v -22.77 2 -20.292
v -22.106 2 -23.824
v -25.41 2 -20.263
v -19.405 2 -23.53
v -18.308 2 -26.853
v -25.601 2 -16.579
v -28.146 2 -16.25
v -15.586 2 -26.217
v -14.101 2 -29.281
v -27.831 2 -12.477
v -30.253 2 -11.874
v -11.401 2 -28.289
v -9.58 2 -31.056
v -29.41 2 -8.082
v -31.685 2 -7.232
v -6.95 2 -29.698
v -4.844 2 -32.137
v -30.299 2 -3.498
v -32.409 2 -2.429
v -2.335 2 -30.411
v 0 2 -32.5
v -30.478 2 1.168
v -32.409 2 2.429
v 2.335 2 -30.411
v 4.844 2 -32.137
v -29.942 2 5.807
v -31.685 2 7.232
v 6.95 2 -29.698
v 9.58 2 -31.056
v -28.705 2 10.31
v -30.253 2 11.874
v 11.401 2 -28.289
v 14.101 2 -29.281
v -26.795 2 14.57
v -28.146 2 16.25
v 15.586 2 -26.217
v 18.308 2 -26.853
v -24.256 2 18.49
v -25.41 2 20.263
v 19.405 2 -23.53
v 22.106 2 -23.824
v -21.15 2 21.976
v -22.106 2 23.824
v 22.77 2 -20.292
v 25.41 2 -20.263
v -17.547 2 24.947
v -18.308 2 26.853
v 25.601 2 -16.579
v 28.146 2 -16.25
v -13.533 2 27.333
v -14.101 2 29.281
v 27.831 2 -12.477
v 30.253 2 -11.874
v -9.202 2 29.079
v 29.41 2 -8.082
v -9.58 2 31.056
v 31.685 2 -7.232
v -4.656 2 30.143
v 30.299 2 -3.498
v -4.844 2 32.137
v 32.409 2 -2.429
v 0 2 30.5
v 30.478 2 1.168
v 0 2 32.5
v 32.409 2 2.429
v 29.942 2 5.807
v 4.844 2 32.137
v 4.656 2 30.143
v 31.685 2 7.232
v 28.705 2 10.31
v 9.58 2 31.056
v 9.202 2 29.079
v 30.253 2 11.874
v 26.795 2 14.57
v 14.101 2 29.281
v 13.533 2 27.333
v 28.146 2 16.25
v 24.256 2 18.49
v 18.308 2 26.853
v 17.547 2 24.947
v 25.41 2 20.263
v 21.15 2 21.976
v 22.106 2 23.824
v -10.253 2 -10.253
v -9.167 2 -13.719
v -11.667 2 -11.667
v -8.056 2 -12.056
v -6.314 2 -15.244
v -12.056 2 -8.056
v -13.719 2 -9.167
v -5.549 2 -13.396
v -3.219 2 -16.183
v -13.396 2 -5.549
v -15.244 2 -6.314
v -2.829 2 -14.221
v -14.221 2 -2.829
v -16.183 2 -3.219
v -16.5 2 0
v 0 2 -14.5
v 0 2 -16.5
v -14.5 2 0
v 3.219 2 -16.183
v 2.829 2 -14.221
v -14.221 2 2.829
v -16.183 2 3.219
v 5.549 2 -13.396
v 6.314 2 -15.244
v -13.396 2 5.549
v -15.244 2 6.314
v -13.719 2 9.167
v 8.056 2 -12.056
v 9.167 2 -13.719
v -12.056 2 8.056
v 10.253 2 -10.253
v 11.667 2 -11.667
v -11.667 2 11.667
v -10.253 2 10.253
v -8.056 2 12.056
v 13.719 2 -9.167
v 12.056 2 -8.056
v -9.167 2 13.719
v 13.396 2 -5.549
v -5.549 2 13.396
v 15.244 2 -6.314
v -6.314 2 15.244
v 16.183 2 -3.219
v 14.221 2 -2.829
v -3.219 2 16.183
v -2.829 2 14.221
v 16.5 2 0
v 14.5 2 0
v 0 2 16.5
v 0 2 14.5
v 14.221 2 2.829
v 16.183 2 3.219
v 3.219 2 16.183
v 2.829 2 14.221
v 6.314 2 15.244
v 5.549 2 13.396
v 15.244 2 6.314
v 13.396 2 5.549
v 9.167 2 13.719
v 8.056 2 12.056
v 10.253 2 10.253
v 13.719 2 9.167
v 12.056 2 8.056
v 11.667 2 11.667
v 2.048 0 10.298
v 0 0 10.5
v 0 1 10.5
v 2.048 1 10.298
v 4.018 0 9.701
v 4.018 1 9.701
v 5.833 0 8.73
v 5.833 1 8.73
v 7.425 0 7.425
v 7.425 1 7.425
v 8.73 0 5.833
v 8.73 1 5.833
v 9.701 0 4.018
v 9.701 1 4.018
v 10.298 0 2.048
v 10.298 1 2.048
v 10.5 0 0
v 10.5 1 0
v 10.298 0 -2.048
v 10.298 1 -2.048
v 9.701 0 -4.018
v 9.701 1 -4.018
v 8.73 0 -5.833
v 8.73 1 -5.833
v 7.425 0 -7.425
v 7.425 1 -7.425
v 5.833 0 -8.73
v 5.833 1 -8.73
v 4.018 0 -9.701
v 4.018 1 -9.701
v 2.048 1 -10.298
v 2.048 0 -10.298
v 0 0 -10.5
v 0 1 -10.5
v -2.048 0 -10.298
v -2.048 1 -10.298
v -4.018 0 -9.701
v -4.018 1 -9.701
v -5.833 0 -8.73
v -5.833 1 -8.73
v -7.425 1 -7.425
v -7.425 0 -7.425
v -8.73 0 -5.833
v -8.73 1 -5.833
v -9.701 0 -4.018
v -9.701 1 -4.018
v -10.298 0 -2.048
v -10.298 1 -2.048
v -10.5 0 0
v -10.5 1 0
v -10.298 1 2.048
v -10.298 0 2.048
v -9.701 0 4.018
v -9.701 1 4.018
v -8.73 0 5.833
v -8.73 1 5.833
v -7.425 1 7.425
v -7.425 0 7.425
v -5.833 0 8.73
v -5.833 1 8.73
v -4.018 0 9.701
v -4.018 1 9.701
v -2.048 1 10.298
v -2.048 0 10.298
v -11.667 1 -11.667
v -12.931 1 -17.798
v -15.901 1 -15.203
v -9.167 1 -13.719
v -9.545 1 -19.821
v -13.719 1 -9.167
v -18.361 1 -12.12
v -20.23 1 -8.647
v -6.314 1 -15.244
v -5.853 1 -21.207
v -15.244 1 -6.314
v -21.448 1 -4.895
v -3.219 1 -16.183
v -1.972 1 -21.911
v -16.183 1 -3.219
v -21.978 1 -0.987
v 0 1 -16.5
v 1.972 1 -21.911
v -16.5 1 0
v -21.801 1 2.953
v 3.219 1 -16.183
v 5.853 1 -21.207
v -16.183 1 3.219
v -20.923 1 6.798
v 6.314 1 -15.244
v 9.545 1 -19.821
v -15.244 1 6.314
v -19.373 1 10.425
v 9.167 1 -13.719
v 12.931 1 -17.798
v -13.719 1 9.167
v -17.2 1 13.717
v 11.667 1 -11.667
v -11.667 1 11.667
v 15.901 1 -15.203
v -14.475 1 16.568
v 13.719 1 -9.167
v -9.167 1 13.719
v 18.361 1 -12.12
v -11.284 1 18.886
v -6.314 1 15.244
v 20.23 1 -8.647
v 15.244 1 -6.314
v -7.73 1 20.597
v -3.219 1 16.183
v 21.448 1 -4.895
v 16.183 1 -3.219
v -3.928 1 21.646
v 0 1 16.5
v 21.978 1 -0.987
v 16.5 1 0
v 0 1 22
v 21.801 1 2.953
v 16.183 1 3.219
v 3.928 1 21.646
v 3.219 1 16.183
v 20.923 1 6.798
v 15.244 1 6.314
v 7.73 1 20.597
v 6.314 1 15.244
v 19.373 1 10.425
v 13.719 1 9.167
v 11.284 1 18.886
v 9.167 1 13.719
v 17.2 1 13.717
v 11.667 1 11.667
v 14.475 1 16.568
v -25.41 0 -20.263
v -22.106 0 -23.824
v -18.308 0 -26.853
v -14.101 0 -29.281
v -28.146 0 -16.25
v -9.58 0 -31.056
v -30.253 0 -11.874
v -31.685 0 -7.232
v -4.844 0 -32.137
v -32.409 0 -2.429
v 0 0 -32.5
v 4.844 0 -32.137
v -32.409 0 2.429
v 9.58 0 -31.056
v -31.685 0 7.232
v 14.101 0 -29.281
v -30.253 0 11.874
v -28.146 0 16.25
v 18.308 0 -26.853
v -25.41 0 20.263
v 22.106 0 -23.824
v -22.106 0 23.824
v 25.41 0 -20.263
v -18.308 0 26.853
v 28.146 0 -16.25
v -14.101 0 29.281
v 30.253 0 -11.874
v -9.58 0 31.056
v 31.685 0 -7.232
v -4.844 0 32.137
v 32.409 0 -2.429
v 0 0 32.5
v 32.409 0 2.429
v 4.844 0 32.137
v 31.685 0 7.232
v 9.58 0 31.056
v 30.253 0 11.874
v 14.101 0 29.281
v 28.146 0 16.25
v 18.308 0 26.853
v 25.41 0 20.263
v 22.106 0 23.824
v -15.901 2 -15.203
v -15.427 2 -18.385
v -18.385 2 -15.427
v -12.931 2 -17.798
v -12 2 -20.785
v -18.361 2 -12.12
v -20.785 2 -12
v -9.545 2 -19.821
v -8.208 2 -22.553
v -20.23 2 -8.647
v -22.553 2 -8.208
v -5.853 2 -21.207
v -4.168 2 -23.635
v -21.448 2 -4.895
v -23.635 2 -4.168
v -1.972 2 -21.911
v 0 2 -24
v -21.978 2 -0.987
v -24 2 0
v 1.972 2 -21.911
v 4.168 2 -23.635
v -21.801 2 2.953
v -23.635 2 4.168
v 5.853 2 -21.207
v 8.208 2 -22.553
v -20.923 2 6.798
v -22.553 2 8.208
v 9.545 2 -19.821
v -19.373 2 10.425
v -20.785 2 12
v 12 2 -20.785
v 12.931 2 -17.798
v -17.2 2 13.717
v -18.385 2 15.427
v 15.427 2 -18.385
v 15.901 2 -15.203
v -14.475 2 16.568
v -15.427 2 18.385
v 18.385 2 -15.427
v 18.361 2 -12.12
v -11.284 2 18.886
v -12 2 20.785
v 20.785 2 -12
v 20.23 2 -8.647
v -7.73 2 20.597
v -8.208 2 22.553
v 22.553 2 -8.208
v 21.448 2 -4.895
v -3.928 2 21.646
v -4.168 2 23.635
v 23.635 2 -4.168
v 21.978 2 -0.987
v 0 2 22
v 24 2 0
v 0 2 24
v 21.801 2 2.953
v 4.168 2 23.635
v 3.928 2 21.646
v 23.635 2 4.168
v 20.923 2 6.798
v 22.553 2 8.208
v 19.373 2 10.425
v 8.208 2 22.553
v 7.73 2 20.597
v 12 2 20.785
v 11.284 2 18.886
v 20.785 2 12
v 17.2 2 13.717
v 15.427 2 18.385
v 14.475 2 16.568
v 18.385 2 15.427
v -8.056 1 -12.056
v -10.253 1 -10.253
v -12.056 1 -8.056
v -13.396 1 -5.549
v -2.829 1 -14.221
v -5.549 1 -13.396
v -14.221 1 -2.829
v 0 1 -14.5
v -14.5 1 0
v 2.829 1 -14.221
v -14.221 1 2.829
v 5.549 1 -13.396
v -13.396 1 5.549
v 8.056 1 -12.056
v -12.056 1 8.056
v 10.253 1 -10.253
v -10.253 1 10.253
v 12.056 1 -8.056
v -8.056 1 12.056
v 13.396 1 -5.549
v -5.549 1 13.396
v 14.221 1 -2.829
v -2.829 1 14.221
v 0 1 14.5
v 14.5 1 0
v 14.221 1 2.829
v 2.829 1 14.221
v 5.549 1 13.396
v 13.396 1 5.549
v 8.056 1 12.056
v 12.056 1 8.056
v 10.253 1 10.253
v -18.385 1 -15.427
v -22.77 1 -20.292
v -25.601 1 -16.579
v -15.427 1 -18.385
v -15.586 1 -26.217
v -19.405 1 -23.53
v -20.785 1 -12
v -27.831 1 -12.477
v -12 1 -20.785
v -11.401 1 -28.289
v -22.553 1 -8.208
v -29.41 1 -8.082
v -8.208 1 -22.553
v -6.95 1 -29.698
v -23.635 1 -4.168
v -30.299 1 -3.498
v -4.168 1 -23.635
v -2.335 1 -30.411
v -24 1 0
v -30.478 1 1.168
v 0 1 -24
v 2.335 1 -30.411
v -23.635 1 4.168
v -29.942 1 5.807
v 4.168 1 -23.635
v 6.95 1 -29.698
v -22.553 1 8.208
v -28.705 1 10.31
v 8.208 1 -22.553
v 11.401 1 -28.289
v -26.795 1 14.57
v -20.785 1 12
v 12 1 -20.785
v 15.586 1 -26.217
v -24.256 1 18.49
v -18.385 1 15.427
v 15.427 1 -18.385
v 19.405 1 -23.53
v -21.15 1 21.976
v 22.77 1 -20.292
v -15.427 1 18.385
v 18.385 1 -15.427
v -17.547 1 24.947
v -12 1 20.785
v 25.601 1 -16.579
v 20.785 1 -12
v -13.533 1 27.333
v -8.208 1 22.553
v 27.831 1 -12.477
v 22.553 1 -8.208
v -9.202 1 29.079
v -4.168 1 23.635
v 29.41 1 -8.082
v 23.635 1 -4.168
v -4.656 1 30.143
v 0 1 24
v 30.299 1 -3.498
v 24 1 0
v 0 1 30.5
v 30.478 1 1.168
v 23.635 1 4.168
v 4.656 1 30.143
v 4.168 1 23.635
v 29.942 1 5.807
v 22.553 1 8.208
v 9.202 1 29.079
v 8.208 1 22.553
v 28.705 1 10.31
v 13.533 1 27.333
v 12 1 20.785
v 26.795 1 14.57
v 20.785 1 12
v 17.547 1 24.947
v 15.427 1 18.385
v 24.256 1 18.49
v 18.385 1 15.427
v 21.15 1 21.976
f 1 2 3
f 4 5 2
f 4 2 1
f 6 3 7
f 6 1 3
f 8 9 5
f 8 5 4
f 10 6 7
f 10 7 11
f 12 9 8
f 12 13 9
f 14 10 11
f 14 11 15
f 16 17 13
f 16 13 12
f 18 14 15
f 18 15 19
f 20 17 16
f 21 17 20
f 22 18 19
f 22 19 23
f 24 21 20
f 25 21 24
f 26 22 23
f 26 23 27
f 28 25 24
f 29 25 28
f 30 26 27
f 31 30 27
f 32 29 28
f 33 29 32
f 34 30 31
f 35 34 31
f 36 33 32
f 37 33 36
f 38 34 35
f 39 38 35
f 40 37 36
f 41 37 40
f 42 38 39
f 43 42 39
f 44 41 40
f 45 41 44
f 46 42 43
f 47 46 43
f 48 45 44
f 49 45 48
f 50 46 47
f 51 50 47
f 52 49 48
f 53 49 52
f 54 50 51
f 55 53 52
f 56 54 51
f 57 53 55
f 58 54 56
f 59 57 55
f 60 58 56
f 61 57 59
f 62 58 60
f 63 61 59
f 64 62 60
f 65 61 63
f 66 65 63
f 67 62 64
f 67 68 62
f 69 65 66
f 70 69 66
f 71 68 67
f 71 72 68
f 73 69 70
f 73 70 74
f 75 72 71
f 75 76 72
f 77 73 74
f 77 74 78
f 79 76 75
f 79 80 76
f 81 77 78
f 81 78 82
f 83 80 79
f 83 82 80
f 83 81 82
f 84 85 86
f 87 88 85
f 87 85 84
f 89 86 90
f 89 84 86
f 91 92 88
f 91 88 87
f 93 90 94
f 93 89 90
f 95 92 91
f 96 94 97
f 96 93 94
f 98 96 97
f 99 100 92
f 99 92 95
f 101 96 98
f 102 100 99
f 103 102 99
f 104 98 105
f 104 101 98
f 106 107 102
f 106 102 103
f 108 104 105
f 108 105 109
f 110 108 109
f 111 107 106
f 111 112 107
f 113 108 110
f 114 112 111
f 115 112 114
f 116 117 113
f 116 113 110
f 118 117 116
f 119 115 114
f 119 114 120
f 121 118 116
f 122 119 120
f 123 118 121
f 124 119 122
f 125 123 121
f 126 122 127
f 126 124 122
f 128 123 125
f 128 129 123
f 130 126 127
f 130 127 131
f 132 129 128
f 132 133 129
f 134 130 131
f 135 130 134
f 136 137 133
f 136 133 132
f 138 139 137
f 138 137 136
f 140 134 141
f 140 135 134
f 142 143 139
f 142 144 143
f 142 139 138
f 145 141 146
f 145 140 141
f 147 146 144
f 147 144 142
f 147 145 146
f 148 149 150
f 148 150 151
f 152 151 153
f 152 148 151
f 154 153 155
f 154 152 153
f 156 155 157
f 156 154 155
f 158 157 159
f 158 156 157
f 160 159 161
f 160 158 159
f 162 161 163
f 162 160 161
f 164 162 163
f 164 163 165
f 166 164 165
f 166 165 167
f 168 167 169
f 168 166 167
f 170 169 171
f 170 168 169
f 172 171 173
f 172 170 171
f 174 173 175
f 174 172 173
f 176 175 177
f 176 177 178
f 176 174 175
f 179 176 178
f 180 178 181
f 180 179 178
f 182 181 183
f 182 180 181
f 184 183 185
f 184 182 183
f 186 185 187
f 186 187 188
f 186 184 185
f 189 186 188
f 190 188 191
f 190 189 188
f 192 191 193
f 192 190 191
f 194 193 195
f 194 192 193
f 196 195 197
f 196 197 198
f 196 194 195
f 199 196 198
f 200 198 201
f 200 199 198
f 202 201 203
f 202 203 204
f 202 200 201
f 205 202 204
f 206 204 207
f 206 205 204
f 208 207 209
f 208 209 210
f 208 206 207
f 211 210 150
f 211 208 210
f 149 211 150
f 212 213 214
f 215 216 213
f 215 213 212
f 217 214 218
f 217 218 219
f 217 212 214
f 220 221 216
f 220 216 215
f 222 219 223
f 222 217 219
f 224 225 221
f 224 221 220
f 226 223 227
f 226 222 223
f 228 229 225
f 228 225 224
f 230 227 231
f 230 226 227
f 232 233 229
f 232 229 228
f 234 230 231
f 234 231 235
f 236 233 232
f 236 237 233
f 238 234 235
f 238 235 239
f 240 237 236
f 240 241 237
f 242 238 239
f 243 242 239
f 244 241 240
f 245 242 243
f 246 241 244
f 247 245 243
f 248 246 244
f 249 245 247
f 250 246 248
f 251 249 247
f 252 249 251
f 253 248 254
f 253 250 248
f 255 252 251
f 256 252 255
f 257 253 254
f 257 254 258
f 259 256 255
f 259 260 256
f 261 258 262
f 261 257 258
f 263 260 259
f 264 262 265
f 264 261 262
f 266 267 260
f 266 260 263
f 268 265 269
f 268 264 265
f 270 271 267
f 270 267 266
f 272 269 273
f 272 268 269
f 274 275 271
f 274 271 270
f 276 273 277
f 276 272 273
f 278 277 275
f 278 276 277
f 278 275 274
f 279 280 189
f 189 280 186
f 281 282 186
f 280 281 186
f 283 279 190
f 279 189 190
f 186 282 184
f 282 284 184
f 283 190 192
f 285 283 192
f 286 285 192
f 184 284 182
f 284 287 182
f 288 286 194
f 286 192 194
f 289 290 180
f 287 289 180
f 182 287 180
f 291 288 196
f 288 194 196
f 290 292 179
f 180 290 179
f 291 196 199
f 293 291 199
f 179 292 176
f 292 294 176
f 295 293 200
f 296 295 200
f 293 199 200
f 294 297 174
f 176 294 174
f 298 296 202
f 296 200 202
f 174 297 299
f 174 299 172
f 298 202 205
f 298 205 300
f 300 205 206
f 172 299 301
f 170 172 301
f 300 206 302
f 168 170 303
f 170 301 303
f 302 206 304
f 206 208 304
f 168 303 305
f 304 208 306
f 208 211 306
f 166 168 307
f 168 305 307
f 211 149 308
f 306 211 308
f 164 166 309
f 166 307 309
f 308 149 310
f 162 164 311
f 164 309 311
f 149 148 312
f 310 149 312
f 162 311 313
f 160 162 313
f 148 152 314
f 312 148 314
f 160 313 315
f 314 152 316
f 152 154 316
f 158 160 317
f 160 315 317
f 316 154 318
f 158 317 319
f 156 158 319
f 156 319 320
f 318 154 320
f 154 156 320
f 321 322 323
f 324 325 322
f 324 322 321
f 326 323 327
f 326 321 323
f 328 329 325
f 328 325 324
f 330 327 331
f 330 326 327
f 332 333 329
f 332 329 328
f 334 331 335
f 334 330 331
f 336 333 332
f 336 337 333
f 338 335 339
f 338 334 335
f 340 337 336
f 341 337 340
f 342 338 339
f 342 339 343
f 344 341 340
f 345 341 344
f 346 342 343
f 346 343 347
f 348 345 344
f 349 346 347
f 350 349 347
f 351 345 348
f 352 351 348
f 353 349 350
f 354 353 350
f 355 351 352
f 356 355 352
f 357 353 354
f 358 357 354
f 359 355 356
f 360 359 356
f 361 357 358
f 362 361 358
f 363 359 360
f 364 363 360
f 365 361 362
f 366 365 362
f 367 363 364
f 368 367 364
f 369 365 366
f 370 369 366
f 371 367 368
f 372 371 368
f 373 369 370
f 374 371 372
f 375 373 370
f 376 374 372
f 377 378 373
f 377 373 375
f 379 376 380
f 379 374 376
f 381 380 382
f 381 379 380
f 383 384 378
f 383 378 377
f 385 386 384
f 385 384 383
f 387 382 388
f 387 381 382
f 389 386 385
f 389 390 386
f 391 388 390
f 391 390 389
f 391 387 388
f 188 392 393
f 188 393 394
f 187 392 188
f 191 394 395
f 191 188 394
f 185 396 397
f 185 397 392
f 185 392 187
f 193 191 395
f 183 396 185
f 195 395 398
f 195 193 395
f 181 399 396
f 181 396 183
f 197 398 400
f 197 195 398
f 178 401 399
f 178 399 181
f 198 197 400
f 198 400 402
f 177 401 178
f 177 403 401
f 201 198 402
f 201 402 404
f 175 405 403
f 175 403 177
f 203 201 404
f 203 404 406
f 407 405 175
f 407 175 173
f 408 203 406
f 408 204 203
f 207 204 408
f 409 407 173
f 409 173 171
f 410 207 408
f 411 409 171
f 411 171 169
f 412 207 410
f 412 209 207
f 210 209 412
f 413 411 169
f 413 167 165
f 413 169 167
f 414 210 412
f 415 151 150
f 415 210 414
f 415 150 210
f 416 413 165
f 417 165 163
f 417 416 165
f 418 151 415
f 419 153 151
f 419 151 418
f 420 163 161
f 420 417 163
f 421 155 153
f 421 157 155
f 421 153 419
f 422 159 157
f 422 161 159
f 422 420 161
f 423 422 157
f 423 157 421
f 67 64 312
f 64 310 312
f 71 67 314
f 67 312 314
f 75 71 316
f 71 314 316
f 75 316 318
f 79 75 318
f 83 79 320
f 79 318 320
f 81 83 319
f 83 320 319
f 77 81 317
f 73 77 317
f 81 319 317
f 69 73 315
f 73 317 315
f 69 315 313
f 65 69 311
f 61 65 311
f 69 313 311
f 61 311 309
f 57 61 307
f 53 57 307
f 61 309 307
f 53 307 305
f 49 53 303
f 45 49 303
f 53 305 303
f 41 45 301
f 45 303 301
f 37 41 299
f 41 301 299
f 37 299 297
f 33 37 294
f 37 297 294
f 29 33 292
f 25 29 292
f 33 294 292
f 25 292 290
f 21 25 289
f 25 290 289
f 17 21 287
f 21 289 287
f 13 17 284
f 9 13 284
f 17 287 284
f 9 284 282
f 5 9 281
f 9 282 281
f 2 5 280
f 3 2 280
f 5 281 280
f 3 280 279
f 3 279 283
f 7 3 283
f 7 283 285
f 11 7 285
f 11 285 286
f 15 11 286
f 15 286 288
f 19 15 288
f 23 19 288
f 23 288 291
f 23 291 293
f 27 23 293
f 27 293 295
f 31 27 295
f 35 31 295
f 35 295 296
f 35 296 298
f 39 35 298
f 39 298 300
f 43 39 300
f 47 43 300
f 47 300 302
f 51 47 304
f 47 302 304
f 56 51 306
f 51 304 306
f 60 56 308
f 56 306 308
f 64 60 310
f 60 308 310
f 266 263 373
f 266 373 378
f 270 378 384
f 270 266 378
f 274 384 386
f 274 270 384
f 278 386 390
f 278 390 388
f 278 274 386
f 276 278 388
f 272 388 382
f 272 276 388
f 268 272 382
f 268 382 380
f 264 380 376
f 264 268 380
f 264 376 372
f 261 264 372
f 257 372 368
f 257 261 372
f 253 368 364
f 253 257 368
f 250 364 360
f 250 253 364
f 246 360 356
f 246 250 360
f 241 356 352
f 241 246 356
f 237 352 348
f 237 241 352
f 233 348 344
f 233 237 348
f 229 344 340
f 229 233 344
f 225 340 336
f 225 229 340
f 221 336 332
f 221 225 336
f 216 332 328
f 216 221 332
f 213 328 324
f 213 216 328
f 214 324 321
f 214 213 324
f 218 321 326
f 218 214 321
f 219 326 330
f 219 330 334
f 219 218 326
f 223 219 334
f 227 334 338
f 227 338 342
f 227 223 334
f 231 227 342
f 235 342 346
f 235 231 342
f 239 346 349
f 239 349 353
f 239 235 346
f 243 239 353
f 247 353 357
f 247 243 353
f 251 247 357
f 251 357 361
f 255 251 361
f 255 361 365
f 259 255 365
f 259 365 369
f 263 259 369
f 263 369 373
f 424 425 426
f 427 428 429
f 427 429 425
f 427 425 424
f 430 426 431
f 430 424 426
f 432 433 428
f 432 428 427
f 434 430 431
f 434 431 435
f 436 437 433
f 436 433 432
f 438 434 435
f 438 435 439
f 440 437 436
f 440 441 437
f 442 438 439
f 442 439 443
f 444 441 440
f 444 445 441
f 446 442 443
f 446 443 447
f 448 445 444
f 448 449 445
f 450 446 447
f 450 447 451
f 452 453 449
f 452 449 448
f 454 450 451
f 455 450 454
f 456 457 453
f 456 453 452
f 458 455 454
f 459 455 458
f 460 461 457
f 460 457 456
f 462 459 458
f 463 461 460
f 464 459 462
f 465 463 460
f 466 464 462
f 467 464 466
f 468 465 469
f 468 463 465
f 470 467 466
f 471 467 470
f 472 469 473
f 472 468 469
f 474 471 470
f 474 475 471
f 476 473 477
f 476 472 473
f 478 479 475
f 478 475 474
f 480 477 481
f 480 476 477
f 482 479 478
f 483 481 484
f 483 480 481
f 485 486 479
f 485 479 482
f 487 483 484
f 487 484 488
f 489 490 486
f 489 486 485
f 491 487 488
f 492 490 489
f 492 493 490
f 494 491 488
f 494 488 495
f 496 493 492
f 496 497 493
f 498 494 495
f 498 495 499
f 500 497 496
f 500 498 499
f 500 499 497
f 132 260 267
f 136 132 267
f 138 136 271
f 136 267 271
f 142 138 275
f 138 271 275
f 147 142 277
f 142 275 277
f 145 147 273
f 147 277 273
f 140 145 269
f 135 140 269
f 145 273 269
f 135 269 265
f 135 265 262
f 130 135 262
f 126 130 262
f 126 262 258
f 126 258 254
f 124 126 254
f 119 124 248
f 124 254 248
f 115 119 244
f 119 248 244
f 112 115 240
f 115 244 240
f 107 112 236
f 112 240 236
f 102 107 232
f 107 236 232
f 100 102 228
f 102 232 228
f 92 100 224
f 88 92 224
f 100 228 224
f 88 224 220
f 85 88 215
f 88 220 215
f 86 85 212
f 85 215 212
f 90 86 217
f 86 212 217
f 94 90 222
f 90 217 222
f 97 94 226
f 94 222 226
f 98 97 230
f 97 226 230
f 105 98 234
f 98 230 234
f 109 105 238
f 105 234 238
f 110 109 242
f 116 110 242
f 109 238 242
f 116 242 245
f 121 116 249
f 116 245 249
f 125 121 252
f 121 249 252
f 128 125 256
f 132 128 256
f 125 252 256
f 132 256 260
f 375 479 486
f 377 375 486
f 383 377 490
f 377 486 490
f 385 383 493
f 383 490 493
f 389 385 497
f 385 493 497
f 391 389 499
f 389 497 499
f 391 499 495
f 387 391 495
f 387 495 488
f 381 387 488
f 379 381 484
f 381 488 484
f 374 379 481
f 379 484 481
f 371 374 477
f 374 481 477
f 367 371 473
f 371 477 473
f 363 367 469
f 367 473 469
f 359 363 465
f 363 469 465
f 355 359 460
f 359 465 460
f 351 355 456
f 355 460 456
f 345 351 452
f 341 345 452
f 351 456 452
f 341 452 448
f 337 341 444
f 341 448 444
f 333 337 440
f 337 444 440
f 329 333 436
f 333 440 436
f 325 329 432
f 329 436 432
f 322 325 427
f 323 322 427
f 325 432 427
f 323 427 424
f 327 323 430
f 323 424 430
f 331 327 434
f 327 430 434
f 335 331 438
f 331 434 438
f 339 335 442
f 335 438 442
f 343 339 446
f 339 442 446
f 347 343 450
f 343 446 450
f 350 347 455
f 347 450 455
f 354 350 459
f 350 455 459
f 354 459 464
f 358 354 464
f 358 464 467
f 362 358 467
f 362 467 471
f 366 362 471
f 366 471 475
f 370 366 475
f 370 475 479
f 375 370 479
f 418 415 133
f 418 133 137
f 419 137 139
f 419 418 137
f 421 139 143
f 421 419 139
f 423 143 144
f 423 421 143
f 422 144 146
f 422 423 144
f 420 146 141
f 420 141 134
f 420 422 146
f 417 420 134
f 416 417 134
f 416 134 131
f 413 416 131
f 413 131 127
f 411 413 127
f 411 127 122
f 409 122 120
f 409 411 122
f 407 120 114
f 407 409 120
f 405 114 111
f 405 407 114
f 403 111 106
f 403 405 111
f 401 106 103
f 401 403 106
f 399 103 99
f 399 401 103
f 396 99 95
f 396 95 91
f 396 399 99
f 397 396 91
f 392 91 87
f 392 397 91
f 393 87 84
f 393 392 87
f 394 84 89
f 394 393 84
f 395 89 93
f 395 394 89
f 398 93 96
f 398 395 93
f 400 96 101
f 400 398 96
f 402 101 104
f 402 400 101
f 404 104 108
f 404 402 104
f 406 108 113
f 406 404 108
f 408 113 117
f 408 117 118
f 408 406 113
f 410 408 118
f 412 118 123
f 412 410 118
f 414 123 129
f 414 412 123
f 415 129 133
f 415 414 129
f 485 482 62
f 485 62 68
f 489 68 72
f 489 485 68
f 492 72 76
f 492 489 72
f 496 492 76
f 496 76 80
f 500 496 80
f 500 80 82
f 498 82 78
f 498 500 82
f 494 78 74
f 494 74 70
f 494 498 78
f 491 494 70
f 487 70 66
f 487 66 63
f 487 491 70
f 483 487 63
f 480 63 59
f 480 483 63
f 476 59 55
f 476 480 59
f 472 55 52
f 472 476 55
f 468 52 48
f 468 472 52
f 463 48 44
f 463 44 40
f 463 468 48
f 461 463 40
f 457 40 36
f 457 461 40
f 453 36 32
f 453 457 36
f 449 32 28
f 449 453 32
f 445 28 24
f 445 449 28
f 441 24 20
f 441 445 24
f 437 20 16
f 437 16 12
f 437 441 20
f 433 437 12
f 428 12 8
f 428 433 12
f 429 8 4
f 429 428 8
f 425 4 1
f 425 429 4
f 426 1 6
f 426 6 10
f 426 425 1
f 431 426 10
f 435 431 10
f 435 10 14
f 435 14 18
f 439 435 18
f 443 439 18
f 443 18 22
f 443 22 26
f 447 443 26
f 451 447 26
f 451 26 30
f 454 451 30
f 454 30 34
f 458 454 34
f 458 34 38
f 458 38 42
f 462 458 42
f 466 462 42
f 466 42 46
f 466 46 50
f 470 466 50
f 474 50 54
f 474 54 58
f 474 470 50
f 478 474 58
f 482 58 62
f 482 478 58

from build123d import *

# Parameters (mm, degrees)
SZKIC1_R                    = 32.5
SZKIC1_R_2                  = 10.5
DODANIE_WYCI_GNI_CIE1_DEPTH = 1
SZKIC2_R                    = 32.5
SZKIC2_R_2                  = 30.5
SZKIC2_R_3                  = 24
SZKIC2_R_4                  = 22
SZKIC2_R_5                  = 16.5
SZKIC2_R_6                  = 14.5
DODANIE_WYCI_GNI_CIE2_DEPTH = 1


with BuildPart() as part:
    # Szkic1 → Dodanie-wyciągnięcie1 (new body)
    with BuildSketch(Plane(origin=(0, 0, 0), x_dir=(1, 0, 0), z_dir=(0, 1, 0))):
        with Locations(Location((0, 0, 0), (0, 0, 270))):
            Circle(SZKIC1_R)
        with Locations(Location((0, 0, 0), (0, 0, 270))):
            Circle(SZKIC1_R_2, mode=Mode.SUBTRACT)
    extrude(amount=DODANIE_WYCI_GNI_CIE1_DEPTH)

    # Szkic2 → Dodanie-wyciągnięcie2 (add)
    # profile 1 of 3: a face of its own
    with BuildSketch(Plane(origin=(0, 1, 0), x_dir=(1, 0, 0), z_dir=(0, 1, 0))):
        with Locations(Location((0, 0, 0), (0, 0, 270))):
            Circle(SZKIC2_R)
        with Locations(Location((0, 0, 0), (0, 0, 270))):
            Circle(SZKIC2_R_2, mode=Mode.SUBTRACT)
    # profile 2 of 3: a face of its own
    with BuildSketch(Plane(origin=(0, 1, 0), x_dir=(1, 0, 0), z_dir=(0, 1, 0))):
        with Locations(Location((0, 0, 0), (0, 0, 270))):
            Circle(SZKIC2_R_3)
        with Locations(Location((0, 0, 0), (0, 0, 270))):
            Circle(SZKIC2_R_4, mode=Mode.SUBTRACT)
    # profile 3 of 3: a face of its own
    with BuildSketch(Plane(origin=(0, 1, 0), x_dir=(1, 0, 0), z_dir=(0, 1, 0))):
        with Locations(Location((0, 0, 0), (0, 0, 270))):
            Circle(SZKIC2_R_5)
        with Locations(Location((0, 0, 0), (0, 0, 270))):
            Circle(SZKIC2_R_6, mode=Mode.SUBTRACT)
    extrude(amount=DODANIE_WYCI_GNI_CIE2_DEPTH)


solid = part.part
